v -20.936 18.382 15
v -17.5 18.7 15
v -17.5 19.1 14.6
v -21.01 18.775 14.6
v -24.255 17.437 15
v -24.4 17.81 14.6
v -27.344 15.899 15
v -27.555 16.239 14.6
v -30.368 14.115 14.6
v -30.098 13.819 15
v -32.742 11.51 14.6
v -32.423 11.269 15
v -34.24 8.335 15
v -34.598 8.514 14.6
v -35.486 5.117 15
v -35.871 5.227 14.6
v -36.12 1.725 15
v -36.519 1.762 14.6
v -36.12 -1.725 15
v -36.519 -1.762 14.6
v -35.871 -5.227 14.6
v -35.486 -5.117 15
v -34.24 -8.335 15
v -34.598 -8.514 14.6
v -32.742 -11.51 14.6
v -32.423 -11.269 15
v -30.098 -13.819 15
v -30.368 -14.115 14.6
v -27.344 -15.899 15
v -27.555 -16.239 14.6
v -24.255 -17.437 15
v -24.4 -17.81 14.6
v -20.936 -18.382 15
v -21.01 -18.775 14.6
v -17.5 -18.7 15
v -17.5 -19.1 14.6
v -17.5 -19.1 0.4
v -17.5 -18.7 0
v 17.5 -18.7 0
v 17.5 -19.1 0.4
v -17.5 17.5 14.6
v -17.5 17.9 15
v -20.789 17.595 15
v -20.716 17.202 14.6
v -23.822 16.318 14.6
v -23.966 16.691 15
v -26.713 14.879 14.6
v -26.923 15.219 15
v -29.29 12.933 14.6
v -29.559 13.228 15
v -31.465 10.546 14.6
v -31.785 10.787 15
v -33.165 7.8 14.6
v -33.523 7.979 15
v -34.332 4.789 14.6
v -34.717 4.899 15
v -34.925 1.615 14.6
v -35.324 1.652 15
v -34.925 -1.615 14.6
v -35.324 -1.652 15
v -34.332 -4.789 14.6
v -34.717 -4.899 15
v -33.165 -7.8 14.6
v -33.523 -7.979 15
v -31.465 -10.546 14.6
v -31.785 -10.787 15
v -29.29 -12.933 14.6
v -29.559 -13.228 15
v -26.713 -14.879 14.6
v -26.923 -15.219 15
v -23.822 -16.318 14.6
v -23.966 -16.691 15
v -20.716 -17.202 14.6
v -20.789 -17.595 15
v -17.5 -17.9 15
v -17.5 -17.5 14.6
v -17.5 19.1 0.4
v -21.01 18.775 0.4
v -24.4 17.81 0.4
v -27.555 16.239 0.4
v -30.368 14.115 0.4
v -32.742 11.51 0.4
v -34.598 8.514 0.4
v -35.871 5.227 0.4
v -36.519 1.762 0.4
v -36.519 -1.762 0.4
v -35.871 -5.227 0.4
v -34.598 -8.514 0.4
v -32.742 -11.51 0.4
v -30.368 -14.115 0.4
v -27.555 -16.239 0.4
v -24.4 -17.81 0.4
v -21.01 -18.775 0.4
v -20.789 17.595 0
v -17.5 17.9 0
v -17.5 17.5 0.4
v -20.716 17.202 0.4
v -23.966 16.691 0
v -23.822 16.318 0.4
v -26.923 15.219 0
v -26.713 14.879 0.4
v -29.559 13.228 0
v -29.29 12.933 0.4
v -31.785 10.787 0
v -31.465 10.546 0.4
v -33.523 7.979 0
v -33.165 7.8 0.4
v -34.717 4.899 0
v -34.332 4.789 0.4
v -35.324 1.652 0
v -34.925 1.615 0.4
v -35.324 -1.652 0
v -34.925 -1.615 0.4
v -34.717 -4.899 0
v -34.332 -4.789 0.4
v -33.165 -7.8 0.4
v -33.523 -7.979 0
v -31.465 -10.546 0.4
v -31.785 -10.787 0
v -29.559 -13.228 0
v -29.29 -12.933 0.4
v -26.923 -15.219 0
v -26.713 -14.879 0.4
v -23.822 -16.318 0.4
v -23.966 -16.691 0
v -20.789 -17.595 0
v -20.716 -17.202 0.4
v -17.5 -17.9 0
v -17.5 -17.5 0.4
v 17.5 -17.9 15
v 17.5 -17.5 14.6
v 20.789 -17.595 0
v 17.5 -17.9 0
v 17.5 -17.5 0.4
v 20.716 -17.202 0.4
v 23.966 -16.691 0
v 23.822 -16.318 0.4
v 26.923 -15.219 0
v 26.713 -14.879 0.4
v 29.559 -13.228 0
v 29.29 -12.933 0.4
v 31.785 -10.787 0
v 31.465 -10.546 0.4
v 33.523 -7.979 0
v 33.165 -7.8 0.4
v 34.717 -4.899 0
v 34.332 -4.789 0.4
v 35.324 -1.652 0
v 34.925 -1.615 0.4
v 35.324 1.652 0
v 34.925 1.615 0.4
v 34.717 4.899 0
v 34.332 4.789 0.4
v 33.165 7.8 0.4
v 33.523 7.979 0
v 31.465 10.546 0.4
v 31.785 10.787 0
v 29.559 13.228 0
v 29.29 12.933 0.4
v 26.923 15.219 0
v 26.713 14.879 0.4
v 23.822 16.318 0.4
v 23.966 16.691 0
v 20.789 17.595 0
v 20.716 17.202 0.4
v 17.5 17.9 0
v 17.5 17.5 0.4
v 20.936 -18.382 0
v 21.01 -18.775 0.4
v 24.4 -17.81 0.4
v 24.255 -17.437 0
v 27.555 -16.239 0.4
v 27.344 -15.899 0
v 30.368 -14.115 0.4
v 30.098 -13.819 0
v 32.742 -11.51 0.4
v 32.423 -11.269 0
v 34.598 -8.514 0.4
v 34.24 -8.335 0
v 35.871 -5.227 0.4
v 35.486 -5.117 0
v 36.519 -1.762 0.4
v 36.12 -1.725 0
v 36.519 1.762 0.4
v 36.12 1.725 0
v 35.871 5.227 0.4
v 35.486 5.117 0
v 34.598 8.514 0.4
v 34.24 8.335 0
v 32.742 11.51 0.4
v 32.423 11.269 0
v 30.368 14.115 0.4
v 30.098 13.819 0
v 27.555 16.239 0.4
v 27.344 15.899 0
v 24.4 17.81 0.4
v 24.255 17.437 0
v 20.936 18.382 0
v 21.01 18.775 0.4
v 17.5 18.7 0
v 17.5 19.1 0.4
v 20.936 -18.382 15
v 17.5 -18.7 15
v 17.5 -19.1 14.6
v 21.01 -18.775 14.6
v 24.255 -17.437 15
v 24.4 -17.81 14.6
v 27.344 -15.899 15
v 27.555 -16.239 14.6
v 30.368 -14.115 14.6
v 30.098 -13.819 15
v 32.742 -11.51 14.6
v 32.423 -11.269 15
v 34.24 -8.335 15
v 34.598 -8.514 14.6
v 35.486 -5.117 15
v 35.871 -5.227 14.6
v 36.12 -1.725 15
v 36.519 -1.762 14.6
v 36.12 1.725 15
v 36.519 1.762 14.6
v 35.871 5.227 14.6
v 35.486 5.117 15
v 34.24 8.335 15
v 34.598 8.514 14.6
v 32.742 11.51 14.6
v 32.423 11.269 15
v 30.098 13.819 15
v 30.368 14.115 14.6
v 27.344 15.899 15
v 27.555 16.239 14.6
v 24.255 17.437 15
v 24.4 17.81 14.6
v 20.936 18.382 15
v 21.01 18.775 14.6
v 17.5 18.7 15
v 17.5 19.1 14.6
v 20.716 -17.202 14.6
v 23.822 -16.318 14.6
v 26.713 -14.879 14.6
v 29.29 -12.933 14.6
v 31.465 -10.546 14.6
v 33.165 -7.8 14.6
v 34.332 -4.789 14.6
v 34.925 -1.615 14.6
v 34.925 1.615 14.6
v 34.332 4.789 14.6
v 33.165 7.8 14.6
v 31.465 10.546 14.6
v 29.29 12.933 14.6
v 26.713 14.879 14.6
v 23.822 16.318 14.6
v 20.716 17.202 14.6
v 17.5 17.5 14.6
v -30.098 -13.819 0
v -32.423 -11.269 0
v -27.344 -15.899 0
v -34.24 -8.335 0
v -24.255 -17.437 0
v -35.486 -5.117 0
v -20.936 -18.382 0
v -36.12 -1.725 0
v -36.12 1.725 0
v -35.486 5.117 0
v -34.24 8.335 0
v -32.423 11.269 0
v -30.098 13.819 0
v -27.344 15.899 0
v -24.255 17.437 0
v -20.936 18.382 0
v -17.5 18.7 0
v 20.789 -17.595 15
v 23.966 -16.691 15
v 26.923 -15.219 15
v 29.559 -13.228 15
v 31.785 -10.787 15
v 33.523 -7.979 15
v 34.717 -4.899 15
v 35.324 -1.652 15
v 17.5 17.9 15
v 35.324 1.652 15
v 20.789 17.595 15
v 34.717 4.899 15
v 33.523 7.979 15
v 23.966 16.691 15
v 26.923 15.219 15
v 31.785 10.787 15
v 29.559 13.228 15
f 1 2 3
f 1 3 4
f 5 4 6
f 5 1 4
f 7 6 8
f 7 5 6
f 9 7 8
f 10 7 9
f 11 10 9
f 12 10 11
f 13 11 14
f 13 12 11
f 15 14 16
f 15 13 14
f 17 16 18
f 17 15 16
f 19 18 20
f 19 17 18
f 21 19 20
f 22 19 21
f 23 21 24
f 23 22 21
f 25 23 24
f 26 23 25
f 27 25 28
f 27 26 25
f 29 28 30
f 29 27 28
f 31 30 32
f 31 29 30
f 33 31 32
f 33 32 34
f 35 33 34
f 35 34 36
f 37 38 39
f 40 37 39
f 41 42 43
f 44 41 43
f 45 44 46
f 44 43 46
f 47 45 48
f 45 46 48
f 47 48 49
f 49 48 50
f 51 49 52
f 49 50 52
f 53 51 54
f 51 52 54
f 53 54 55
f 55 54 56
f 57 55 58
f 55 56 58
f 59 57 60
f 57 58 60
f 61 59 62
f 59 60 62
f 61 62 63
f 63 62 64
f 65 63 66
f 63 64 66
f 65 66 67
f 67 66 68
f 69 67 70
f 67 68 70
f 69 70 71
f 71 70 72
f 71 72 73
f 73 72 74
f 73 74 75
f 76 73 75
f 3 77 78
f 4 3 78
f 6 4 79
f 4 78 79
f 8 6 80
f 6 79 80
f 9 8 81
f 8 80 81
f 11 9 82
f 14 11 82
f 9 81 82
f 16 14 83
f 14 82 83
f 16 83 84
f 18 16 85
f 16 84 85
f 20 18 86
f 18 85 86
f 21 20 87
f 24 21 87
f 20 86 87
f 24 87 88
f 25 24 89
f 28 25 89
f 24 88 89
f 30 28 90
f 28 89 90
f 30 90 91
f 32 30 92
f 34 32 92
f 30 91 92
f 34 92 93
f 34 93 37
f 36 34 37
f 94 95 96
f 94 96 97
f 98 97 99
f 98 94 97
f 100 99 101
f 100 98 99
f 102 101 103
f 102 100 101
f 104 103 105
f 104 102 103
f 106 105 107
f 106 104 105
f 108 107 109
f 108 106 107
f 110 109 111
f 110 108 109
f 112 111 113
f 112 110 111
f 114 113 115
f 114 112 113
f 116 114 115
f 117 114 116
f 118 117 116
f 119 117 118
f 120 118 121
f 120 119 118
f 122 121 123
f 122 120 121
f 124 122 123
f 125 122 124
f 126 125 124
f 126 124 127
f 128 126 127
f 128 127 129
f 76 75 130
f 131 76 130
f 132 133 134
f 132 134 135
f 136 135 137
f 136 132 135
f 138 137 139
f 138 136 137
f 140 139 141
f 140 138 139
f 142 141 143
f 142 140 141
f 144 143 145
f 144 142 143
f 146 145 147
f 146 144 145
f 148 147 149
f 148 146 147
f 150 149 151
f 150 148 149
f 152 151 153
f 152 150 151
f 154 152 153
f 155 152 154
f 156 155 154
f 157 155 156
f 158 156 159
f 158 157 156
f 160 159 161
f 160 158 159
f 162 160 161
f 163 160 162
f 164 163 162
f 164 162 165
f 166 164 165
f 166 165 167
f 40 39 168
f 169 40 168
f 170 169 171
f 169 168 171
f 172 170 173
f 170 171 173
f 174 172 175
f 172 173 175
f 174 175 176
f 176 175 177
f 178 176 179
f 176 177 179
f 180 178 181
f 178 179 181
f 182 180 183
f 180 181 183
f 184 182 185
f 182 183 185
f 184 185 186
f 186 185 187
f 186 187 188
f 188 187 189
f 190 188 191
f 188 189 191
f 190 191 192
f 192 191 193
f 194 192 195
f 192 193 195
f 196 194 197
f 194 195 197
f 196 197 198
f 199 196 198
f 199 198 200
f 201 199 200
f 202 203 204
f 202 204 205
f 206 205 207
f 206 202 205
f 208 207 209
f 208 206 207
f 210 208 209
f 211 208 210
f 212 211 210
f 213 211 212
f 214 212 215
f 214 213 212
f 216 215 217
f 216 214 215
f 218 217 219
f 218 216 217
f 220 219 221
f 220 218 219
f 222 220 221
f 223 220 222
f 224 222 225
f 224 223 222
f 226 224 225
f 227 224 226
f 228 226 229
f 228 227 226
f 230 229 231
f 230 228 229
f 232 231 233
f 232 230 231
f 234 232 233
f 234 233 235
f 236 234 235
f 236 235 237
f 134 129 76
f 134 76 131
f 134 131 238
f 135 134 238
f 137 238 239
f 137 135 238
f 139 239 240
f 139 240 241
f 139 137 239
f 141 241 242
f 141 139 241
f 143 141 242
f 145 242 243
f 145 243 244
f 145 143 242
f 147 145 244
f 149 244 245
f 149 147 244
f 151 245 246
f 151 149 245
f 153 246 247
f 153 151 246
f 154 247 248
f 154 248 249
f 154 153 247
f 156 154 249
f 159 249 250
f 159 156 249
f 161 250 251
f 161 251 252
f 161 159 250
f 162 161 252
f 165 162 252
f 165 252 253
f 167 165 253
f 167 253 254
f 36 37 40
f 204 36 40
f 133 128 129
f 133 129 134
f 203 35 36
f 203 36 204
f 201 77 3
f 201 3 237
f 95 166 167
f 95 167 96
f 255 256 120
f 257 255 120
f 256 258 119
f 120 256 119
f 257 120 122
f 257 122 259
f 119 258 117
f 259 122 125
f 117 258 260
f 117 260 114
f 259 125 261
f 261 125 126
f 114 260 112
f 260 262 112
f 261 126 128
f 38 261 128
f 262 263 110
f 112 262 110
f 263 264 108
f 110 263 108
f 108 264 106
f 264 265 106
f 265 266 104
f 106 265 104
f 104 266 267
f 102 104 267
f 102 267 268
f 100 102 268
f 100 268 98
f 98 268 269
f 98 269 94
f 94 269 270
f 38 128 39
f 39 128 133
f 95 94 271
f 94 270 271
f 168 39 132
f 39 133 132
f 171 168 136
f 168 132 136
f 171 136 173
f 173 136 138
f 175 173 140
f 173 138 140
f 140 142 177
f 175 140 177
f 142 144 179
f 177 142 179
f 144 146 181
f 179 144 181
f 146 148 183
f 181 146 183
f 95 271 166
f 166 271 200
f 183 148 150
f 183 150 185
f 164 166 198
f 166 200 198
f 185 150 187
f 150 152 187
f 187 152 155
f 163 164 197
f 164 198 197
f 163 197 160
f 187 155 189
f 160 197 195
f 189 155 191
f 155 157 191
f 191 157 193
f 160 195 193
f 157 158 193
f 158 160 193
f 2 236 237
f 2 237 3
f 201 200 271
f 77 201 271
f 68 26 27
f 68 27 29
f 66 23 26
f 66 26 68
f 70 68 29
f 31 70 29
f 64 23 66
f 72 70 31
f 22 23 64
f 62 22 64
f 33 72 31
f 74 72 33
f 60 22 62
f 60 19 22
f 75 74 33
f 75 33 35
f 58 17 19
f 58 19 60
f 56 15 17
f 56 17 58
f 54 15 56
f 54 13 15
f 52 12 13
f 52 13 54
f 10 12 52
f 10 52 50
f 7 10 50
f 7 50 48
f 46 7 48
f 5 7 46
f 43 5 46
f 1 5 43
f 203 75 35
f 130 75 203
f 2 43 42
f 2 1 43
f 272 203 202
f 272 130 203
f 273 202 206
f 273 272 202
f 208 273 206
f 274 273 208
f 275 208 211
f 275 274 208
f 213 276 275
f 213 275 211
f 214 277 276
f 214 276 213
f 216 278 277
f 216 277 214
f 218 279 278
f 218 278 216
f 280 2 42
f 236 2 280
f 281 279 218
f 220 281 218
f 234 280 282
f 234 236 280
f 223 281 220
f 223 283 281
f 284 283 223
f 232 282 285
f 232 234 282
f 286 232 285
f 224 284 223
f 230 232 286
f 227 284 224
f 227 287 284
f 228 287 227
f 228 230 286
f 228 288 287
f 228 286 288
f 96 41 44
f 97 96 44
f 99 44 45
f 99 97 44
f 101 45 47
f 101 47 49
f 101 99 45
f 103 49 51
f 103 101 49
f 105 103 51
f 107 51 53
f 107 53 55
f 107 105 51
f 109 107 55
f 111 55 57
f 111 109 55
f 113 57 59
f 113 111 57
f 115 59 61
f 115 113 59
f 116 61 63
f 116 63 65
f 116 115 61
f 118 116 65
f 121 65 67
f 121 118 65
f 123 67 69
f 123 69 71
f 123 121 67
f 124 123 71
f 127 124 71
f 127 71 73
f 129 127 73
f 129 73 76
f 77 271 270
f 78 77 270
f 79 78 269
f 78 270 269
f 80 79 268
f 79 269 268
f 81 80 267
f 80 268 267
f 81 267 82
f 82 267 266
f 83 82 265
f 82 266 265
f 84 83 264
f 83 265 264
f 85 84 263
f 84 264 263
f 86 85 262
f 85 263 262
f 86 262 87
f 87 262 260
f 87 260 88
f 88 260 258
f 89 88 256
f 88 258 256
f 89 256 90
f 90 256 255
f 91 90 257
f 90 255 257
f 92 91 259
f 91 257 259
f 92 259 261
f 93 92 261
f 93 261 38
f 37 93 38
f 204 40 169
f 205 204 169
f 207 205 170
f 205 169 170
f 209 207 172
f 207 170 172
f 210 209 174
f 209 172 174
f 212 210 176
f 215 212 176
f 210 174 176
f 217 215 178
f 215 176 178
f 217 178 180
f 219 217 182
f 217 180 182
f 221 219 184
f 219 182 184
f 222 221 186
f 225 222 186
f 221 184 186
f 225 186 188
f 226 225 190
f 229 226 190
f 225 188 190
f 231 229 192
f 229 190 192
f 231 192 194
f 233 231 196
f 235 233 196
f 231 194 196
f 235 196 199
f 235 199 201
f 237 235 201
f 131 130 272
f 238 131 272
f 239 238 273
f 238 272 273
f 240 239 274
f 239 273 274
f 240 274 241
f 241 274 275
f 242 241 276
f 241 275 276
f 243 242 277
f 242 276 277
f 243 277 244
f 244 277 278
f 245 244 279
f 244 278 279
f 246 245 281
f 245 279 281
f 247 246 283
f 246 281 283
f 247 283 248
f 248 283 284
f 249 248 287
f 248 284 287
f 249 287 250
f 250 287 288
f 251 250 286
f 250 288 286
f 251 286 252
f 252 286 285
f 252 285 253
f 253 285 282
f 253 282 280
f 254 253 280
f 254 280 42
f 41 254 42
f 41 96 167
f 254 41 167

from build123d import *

# Parameters (mm, degrees)
PAD_DEPTH    = 15
CHAMFER_SIZE = 0.4


with BuildPart() as part:
    # Sketch → Pad (new body)
    with BuildSketch(Plane.XY):
        with BuildLine():
            ThreePointArc((-17.5, 19.1), (-36.6, 0), (-17.5, -19.1))
            Line((-17.5, -19.1), (17.5, -19.1))
            ThreePointArc((17.5, -19.1), (36.6, 0), (17.5, 19.1))
            Line((-17.5, 19.1), (17.5, 19.1))
        make_face()
        with BuildLine():
            ThreePointArc((-17.5, 17.5), (-35, 0), (-17.5, -17.5))
            Line((-17.5, -17.5), (17.5, -17.5))
            ThreePointArc((17.5, -17.5), (35, 0), (17.5, 17.5))
            Line((-17.5, 17.5), (17.5, 17.5))
        make_face(mode=Mode.SUBTRACT)
    extrude(amount=PAD_DEPTH)

    # Chamfer
    chamfer_edges = [part.edges().sort_by_distance(p)[0] for p in [
        (-36.6, 0, 15),
        (0, -19.1, 15),
        (36.6, 0, 15),
        (0, 19.1, 15),
        (-35, 0, 15),
        (0, -17.5, 15),
        (35, 0, 15),
        (0, 17.5, 15),
        (-36.6, 0, 0),
        (0, -19.1, 0),
        (36.6, 0, 0),
        (0, 19.1, 0),
        (-35, 0, 0),
        (0, -17.5, 0),
        (35, 0, 0),
        (0, 17.5, 0),
    ]]
    chamfer(chamfer_edges, length=CHAMFER_SIZE)


solid = part.part
